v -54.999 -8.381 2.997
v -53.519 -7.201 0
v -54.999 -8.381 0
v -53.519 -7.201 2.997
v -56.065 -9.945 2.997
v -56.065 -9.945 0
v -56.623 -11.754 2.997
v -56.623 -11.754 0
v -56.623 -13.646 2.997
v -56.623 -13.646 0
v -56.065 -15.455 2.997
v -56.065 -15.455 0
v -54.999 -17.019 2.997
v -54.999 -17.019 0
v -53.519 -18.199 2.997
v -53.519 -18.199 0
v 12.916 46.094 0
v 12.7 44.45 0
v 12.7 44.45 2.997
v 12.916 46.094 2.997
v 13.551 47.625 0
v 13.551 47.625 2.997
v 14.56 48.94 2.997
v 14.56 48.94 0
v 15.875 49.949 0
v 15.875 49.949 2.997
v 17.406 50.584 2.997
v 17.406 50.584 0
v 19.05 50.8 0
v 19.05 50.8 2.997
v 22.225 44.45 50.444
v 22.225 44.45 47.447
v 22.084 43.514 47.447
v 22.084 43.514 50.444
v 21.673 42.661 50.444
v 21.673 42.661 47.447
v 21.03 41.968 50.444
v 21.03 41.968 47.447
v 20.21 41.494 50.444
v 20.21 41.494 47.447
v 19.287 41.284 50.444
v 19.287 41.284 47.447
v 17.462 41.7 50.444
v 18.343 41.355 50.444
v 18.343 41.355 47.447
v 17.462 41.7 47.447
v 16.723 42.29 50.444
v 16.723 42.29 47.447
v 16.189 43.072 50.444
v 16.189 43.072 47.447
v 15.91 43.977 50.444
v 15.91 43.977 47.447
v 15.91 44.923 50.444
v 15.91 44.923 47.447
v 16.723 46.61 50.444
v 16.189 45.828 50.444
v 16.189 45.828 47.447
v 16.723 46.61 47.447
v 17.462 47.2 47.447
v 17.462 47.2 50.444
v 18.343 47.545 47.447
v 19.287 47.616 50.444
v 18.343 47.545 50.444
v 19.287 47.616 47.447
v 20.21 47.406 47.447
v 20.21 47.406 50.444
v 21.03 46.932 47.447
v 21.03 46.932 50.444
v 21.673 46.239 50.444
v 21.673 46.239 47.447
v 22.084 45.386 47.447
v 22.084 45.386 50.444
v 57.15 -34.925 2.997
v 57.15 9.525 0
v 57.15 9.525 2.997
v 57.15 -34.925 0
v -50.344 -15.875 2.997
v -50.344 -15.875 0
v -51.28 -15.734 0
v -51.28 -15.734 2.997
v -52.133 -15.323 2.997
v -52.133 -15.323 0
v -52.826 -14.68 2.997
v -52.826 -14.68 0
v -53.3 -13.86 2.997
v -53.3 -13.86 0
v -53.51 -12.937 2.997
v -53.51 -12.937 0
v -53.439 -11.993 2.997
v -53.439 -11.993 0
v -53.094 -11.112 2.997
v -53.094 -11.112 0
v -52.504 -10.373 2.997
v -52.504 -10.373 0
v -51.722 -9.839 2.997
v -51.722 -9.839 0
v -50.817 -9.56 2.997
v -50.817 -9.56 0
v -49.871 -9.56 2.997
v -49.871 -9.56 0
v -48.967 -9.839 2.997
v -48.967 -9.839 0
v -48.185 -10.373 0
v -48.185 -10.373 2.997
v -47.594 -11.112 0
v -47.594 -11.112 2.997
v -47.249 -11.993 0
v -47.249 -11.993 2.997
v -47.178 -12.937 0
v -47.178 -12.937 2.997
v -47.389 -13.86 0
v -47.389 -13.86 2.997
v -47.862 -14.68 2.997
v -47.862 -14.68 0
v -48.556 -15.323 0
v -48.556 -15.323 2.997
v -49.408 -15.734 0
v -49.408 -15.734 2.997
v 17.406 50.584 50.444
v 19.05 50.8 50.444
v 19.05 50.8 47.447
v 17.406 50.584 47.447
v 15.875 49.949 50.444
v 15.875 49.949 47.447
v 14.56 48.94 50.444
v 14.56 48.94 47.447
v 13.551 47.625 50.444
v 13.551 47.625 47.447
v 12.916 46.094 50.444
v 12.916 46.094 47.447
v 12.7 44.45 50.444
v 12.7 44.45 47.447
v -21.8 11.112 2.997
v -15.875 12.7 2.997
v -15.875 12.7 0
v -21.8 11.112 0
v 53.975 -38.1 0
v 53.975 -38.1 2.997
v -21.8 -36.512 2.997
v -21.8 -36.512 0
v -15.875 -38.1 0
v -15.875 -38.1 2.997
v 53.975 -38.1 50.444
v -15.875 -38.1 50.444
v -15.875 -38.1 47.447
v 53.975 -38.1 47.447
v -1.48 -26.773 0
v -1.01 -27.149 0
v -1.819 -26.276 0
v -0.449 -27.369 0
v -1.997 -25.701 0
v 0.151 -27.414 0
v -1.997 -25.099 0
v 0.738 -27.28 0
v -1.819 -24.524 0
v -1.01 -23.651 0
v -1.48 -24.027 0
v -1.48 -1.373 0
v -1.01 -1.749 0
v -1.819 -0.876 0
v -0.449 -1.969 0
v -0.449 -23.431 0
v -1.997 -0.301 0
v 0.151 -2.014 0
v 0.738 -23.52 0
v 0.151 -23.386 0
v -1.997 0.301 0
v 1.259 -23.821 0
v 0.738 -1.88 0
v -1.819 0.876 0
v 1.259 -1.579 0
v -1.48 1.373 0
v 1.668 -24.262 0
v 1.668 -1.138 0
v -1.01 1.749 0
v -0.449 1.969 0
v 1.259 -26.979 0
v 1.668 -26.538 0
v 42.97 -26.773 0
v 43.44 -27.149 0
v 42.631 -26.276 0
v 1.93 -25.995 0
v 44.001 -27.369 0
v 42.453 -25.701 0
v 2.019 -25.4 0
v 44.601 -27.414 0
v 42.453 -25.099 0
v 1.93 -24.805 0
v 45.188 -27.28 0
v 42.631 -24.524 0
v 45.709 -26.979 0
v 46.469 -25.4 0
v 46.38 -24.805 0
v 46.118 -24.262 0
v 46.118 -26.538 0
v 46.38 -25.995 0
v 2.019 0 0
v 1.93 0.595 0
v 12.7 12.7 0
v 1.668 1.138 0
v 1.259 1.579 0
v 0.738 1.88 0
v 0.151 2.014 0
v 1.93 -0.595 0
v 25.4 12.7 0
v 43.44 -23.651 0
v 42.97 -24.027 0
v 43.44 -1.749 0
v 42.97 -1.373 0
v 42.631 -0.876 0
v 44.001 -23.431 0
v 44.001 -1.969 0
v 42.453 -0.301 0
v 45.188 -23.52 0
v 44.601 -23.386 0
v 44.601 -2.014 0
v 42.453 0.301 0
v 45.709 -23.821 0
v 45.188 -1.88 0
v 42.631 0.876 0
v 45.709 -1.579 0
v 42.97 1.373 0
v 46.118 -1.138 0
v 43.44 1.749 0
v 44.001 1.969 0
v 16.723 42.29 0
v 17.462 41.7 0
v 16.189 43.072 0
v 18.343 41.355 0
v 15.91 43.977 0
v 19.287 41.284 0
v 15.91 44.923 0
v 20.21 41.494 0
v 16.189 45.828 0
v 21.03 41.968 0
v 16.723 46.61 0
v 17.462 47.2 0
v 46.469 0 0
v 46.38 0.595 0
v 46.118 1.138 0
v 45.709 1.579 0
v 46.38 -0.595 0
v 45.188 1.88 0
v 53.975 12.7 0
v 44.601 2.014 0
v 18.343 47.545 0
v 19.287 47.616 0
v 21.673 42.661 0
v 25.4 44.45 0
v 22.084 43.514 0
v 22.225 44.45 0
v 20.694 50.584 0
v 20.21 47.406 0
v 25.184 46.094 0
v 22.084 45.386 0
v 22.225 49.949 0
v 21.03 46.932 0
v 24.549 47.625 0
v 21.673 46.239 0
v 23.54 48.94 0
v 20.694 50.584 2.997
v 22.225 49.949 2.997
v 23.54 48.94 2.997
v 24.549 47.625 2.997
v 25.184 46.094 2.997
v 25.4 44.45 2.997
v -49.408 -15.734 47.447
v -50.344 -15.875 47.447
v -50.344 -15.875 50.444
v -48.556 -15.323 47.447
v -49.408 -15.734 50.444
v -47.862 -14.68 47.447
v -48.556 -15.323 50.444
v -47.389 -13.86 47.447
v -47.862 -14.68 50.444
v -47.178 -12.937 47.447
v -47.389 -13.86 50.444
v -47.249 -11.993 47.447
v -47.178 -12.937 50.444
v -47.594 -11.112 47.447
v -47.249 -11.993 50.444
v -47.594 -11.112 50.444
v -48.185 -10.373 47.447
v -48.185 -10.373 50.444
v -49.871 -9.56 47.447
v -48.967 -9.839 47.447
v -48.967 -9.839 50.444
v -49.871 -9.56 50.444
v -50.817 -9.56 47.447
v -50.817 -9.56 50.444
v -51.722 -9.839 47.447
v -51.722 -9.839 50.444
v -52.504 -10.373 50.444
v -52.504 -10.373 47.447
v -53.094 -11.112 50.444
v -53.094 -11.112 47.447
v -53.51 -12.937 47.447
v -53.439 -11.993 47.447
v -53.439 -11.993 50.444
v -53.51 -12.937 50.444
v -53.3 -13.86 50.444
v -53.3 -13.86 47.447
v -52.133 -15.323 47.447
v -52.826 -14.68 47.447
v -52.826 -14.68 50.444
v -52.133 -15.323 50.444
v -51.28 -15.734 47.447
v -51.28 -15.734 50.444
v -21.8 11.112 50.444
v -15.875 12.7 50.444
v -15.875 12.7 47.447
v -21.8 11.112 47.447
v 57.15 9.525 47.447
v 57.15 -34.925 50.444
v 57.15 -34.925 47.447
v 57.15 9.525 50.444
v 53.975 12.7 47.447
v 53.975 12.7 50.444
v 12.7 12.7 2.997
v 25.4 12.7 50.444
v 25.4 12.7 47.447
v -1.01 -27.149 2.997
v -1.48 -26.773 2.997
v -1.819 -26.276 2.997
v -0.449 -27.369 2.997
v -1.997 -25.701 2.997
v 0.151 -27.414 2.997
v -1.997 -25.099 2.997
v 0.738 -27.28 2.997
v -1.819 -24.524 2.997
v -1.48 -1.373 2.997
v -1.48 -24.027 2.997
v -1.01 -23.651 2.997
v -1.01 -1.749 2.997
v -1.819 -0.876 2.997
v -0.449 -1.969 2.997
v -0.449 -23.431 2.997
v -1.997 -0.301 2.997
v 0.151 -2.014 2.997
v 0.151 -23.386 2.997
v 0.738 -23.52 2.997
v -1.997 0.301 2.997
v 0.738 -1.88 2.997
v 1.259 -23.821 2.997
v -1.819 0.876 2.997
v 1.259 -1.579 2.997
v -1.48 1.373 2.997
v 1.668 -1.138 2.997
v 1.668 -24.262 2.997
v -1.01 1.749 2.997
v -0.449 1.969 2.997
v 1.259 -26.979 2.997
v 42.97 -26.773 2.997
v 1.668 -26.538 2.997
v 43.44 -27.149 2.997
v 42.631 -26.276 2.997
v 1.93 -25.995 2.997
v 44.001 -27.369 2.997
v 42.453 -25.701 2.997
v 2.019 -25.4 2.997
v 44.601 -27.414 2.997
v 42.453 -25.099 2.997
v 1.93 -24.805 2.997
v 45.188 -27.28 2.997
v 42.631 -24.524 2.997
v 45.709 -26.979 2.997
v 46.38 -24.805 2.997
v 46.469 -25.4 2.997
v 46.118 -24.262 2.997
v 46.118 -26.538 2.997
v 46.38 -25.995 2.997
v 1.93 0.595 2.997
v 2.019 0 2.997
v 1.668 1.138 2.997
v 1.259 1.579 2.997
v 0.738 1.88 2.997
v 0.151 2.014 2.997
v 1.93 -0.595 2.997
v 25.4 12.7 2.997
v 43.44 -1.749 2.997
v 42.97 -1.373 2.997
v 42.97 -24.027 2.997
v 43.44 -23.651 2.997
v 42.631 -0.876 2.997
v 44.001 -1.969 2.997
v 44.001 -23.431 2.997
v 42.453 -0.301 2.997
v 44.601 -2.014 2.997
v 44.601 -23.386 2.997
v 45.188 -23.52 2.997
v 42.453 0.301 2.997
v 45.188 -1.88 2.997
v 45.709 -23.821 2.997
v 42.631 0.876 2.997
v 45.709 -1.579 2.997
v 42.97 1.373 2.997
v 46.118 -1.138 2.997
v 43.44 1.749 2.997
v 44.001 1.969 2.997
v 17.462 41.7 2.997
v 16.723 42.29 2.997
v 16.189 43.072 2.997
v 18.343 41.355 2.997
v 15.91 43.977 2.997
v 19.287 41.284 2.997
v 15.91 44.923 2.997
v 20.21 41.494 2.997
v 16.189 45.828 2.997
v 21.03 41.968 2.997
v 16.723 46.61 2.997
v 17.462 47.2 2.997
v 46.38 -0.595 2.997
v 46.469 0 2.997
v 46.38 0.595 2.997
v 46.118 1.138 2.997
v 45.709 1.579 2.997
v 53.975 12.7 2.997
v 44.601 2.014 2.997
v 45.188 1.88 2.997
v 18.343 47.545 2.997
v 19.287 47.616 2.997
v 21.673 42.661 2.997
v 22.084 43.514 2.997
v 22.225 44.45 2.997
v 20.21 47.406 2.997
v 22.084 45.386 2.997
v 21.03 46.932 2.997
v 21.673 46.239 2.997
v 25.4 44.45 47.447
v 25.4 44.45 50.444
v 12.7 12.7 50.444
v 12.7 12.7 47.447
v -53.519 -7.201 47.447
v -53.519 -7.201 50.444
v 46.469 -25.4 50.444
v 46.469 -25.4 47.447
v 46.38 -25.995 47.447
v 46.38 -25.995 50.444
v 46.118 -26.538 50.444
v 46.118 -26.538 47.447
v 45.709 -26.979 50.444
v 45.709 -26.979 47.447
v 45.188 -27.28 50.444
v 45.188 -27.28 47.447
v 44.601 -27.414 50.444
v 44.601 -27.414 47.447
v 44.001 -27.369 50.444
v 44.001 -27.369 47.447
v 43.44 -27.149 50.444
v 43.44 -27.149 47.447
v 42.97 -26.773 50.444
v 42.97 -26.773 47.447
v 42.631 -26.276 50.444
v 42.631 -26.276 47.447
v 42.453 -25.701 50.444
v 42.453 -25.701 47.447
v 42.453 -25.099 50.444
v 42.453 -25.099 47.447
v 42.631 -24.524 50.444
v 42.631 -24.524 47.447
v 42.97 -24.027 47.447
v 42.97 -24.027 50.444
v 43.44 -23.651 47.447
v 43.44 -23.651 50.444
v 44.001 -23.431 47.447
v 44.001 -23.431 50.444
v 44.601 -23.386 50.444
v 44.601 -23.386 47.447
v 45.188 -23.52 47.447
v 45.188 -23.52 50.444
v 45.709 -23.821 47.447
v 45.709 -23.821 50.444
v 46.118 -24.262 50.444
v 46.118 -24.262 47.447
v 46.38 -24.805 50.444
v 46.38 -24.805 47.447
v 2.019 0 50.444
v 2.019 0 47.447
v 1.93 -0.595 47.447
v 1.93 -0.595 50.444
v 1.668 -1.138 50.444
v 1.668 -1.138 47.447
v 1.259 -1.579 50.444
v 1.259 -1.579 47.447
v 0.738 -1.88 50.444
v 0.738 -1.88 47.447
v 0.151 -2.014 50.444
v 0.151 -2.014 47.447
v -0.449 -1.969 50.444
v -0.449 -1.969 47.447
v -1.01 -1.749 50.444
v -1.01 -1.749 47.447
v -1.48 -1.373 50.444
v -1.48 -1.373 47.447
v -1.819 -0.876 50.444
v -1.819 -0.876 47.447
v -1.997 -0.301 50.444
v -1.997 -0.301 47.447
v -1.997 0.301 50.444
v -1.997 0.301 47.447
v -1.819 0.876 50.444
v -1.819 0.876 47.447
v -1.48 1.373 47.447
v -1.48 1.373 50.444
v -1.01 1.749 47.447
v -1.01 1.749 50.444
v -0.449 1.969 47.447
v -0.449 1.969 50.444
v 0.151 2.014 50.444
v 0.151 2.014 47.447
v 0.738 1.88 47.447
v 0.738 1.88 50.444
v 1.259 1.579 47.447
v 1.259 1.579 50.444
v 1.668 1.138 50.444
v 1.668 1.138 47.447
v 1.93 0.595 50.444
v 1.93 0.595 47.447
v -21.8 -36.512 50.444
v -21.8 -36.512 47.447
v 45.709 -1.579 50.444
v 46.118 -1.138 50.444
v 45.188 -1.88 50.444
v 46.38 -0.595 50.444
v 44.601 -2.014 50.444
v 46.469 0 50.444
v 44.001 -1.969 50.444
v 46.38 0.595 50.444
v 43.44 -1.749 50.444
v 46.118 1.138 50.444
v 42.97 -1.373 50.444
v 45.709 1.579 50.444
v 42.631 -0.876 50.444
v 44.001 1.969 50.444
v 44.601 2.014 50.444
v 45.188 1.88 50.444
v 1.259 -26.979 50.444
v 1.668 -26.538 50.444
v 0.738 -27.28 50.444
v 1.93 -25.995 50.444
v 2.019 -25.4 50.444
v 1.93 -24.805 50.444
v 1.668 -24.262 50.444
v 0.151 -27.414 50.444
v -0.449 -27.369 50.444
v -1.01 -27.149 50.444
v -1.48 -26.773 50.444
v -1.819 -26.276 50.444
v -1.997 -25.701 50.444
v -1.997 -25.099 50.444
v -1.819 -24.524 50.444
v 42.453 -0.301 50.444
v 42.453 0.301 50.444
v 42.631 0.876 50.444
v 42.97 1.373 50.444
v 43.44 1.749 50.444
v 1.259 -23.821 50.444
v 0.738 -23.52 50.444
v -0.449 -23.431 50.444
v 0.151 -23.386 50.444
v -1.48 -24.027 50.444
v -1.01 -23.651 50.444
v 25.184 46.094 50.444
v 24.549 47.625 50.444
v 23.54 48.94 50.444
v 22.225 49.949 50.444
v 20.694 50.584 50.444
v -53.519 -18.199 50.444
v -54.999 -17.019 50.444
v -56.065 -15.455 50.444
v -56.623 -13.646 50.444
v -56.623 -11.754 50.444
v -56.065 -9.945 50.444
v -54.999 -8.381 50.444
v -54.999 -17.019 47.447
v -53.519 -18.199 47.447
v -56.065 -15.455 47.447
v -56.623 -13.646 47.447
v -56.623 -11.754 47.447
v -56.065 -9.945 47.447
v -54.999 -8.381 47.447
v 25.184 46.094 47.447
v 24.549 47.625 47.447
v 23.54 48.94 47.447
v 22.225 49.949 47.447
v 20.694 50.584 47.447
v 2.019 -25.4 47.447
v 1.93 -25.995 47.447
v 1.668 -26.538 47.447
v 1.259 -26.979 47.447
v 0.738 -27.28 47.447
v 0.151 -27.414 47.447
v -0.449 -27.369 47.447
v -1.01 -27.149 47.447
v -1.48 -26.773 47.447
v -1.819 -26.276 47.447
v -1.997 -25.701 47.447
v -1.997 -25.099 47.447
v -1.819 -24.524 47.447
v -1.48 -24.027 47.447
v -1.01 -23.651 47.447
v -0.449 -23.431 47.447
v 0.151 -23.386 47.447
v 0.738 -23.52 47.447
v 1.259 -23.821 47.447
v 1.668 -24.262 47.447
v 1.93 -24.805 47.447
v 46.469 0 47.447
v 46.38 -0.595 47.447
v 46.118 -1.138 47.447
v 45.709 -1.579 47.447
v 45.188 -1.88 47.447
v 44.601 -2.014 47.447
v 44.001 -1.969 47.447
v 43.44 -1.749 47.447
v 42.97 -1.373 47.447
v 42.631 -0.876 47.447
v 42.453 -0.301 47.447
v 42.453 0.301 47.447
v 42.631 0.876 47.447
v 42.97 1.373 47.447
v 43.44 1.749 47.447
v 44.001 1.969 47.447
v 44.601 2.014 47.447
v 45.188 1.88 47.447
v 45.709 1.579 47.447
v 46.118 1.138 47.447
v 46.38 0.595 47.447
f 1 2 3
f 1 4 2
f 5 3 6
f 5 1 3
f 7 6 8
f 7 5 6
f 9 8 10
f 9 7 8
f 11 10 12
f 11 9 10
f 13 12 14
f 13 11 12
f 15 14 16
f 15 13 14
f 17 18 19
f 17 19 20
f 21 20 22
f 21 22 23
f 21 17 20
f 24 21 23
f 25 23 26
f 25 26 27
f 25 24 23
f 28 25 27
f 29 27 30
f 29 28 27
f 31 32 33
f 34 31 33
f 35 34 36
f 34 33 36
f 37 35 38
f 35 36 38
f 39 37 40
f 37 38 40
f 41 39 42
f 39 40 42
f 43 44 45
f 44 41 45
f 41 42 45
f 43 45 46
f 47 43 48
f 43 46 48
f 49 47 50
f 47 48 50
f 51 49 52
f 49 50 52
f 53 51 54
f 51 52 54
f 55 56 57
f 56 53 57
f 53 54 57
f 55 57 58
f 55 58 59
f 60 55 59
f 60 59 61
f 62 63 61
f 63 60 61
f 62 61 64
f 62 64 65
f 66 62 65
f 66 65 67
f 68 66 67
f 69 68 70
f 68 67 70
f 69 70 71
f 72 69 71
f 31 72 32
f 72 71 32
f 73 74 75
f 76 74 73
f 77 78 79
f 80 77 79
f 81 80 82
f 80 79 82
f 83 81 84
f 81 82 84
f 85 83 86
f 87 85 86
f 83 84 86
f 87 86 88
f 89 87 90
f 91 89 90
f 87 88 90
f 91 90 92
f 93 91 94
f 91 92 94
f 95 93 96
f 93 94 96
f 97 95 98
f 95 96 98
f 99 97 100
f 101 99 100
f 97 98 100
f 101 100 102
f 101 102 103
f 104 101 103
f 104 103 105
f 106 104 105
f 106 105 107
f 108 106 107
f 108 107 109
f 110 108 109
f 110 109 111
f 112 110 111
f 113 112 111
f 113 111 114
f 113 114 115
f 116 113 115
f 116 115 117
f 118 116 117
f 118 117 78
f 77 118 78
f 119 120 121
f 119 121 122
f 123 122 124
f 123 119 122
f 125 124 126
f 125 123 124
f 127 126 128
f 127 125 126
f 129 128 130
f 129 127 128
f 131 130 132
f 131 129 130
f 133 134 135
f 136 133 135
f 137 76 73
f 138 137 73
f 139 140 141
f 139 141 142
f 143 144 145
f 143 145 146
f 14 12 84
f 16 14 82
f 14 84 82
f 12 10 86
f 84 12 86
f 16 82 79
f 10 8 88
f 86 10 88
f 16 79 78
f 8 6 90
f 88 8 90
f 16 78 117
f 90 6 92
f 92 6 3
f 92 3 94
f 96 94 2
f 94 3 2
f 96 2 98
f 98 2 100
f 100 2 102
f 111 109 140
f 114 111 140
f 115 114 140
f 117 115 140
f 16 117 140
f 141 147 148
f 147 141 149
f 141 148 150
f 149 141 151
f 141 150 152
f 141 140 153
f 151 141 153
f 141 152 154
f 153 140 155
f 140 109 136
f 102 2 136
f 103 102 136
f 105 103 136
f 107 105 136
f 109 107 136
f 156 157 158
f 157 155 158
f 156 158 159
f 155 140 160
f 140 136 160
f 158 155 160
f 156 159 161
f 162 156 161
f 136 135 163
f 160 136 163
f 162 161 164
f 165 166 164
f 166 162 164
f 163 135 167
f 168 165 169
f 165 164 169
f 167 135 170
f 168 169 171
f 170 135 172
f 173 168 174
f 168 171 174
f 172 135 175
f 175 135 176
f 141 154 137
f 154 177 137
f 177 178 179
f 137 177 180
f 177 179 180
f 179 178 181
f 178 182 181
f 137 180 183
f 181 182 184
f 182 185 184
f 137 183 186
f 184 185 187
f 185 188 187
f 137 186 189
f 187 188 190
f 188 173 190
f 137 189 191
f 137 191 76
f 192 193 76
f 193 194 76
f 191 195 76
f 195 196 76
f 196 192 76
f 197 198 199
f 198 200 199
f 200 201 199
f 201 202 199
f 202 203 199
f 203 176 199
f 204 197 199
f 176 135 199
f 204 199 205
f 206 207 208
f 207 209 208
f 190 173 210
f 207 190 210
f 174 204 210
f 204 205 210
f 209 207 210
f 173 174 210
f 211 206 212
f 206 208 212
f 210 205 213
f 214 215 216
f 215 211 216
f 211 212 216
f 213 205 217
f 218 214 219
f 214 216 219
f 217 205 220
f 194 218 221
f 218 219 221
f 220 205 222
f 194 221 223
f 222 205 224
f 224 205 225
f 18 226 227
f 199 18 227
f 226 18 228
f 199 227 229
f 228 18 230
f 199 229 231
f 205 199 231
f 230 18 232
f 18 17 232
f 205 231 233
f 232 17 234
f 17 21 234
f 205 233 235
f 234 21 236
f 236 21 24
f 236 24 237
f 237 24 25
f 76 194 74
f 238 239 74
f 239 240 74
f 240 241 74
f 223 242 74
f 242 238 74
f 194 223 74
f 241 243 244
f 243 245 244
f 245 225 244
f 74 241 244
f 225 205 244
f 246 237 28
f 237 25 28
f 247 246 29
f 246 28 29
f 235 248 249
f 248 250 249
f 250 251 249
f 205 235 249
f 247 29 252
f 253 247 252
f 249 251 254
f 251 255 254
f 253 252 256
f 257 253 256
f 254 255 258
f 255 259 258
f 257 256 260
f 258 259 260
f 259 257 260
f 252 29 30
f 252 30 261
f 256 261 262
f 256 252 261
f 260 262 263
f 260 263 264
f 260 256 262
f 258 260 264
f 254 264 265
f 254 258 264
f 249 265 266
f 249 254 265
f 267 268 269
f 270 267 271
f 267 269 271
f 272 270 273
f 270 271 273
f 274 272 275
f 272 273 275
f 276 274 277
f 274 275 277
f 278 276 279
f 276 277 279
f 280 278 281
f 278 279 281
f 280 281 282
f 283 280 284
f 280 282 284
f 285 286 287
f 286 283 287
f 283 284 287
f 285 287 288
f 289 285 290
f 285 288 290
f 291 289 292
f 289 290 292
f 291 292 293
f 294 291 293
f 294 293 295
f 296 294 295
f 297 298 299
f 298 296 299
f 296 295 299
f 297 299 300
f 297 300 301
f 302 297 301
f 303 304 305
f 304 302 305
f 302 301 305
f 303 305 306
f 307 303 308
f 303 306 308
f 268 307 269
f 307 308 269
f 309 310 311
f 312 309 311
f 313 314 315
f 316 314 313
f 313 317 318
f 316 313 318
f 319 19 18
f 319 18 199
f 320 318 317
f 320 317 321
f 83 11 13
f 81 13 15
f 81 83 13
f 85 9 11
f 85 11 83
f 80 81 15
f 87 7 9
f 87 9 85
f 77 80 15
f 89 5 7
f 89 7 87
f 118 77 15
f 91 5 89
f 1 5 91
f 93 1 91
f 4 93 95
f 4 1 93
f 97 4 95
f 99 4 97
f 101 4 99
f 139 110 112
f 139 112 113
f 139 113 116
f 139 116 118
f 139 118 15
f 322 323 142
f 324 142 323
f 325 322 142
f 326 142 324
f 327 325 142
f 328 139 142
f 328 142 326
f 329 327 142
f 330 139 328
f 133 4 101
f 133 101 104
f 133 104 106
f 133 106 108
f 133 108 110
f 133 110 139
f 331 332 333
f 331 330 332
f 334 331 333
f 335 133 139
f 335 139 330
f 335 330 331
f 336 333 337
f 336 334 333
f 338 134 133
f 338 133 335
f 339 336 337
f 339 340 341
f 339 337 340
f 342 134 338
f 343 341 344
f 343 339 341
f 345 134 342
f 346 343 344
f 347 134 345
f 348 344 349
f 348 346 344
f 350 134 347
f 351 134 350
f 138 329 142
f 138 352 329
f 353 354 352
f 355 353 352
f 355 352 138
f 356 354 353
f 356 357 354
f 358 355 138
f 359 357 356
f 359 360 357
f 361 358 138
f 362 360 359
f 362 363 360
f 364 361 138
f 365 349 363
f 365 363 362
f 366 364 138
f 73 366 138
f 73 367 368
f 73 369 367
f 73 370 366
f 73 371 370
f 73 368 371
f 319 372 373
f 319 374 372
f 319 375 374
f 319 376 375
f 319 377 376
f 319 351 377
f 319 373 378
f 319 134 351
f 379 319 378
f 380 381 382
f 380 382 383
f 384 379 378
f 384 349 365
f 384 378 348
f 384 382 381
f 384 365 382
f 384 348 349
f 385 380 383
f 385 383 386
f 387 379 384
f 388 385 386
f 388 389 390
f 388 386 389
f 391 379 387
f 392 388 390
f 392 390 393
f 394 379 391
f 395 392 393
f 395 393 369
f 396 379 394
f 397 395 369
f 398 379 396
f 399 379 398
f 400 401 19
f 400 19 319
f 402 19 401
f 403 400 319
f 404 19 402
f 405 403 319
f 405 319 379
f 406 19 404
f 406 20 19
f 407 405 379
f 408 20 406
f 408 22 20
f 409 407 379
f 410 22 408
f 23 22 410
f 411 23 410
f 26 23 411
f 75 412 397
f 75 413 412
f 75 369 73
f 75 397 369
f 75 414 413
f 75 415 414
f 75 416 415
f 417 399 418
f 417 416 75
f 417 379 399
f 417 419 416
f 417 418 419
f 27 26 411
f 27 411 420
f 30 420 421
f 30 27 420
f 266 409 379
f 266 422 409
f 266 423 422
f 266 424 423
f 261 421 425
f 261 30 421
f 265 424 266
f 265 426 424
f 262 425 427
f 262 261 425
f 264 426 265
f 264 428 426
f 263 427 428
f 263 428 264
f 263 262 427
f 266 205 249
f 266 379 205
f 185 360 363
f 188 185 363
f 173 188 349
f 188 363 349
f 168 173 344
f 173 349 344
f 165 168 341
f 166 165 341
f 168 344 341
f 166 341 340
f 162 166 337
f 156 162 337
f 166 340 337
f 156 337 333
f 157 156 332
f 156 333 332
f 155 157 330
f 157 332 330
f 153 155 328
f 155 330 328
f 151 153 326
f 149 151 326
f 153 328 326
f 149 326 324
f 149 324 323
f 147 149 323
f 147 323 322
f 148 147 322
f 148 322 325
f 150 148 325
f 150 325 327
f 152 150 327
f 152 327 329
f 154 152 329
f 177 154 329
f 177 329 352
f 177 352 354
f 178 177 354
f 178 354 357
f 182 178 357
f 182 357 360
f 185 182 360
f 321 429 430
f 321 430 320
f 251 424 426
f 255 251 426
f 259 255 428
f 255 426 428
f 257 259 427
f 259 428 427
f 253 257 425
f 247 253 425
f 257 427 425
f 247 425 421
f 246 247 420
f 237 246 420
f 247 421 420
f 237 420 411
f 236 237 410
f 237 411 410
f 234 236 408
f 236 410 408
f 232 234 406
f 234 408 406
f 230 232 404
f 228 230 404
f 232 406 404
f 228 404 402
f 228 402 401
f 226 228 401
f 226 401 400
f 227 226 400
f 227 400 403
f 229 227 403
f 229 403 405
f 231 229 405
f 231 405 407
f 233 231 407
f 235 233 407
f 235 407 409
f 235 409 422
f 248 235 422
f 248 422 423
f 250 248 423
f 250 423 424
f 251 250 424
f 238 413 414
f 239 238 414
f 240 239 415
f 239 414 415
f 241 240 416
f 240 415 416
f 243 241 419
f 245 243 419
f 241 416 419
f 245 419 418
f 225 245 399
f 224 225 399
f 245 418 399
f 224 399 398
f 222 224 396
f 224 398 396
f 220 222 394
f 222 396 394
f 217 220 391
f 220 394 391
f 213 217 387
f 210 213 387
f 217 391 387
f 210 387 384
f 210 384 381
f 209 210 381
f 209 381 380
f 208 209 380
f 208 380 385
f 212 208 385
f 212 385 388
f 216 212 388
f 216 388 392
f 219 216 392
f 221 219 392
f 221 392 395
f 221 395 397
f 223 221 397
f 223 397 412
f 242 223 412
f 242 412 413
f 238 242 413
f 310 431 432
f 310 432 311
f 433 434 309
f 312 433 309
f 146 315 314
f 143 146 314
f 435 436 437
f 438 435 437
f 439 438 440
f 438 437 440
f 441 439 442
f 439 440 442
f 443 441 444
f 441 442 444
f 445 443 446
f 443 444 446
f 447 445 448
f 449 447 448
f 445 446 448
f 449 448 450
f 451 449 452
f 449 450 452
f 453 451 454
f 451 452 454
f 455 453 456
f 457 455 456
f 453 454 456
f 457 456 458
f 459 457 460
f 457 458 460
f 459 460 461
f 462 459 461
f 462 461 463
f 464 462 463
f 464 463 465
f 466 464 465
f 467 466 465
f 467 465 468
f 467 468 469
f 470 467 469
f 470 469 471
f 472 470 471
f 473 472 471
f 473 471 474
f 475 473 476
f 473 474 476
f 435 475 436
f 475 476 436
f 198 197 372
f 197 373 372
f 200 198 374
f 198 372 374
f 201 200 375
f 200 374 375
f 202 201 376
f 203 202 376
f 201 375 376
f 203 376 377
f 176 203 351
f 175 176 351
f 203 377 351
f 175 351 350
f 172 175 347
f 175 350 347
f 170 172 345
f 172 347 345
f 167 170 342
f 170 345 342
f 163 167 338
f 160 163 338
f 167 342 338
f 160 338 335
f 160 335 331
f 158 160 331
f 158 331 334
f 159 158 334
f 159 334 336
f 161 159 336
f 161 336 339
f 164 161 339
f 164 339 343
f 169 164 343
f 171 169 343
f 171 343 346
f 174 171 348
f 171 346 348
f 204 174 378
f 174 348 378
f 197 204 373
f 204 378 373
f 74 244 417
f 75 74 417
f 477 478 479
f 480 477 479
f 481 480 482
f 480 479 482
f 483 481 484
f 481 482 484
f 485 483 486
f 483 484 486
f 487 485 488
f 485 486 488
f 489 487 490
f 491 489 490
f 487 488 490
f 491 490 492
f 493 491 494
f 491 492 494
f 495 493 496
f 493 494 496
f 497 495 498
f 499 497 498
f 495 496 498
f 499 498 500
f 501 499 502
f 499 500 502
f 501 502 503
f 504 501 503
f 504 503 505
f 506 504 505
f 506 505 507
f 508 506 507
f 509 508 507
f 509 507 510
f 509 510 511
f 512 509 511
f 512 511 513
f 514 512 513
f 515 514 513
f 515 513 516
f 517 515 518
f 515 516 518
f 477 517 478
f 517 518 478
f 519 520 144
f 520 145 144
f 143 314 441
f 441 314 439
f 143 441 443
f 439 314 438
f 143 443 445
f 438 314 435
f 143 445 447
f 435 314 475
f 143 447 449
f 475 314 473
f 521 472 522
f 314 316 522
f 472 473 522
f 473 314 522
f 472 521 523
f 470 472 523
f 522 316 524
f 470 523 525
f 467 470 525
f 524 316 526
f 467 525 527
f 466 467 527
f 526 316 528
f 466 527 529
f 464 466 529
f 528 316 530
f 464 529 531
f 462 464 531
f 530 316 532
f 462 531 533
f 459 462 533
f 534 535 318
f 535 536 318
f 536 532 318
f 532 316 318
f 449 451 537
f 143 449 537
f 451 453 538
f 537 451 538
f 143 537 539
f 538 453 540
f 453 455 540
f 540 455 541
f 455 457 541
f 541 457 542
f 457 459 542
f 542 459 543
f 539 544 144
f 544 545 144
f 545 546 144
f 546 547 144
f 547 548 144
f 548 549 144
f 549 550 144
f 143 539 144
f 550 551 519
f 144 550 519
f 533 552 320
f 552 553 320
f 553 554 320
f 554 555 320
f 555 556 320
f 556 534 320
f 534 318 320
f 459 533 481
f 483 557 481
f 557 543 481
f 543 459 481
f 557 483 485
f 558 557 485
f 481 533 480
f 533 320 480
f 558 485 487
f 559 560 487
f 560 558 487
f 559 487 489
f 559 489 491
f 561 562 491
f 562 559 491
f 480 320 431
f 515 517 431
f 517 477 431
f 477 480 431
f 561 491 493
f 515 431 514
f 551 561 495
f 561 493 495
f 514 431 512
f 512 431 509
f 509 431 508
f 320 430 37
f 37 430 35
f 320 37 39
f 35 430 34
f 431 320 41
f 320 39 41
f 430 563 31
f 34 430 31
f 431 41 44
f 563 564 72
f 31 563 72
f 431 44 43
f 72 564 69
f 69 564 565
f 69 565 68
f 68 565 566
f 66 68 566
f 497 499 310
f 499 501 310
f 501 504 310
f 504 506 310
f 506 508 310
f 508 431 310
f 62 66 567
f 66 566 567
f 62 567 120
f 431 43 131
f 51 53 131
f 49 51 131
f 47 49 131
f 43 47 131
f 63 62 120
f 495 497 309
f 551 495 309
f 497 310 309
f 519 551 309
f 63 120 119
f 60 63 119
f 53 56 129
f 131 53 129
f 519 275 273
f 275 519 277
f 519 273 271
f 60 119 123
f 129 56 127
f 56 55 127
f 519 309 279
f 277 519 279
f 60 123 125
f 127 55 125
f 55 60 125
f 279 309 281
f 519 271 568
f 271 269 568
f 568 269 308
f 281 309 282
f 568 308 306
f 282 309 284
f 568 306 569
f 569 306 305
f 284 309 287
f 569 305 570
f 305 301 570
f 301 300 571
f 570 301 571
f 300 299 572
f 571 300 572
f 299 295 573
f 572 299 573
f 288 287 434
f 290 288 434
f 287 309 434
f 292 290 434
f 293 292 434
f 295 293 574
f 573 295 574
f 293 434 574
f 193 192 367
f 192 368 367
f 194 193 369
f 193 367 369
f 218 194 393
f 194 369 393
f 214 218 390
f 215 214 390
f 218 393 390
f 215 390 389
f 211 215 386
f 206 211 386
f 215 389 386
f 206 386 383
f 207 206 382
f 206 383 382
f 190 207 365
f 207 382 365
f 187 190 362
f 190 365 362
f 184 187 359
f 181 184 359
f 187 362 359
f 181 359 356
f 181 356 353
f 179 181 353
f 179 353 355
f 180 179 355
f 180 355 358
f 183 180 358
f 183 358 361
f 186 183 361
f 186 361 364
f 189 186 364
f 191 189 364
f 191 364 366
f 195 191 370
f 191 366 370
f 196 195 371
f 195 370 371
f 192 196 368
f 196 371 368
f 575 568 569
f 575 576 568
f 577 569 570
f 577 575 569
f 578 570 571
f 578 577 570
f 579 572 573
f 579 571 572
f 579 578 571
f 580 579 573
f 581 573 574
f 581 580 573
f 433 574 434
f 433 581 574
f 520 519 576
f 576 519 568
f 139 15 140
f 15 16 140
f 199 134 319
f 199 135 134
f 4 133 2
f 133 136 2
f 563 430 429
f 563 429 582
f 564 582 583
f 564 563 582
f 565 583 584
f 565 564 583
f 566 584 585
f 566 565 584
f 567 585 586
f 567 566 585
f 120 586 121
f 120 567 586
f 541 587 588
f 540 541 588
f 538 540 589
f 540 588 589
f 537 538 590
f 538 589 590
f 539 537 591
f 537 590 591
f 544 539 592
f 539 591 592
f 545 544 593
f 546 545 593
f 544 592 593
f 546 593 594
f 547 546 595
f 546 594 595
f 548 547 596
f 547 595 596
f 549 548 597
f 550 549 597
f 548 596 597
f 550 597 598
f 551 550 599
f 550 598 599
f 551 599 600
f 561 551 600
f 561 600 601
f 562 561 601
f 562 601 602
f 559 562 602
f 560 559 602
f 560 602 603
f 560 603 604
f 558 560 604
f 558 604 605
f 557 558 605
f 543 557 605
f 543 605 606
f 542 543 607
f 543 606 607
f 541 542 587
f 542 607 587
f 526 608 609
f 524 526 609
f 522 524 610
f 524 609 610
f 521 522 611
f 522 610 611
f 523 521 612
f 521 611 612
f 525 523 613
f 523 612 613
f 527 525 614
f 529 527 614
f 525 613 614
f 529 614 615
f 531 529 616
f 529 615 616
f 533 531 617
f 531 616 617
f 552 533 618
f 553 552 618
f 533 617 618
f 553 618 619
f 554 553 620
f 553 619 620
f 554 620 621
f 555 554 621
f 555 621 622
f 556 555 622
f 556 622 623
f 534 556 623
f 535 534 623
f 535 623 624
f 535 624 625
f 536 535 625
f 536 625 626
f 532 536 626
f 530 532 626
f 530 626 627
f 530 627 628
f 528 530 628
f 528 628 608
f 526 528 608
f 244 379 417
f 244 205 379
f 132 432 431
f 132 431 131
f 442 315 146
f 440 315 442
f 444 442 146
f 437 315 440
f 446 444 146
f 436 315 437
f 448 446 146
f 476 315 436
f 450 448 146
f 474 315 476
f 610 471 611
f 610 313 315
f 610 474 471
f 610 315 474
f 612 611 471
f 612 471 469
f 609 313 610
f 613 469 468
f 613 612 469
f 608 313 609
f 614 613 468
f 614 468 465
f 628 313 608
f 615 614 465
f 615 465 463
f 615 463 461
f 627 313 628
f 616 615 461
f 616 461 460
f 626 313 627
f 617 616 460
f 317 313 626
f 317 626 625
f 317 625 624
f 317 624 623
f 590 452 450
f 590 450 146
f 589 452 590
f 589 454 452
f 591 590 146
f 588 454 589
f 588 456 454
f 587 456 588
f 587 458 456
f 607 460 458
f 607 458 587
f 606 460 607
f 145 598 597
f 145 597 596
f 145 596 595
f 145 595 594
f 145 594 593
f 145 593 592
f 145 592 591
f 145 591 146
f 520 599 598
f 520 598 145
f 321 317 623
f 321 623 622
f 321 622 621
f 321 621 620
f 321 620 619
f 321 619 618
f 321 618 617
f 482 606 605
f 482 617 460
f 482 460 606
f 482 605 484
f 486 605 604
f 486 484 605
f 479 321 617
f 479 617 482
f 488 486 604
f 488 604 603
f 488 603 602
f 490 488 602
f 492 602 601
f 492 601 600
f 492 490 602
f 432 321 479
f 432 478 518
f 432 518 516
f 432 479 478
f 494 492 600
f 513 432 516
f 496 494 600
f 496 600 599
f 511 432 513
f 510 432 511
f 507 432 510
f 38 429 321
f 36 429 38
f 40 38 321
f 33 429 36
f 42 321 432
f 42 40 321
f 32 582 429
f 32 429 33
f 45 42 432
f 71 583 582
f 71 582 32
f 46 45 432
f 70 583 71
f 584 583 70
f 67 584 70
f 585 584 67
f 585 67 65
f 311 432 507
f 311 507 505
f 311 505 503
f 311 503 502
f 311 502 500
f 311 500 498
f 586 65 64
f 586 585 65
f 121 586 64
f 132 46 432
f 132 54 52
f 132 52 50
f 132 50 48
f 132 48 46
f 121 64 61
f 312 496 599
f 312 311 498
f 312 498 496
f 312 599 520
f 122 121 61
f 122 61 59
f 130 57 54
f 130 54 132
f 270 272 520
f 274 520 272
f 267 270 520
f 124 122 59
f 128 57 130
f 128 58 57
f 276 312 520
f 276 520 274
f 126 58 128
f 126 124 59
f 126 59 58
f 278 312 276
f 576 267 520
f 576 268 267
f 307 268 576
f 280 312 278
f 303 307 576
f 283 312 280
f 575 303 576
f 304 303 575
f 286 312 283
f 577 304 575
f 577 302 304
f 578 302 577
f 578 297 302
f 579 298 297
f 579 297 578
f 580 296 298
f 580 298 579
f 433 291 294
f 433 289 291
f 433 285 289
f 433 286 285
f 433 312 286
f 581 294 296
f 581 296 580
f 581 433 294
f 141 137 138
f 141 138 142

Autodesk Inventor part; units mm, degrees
ref_plane "YZ Plane" through (0, 0, 0) normal (1, 0, 0) x (0, 1, 0)
ref_plane "XZ Plane" through (0, 0, 0) normal (0, 1, 0) x (-1, 0, 0)
sketch "Sketch1" plane through (0, 0, 0) normal (0, 0, 1) x (1, 0, 0)
  line L0 (0, 0) -> (44.45, 0) construction
  line L1 (44.45, 0) -> (44.45, -25.4) construction
  line L2 (44.45, -25.4) -> (0, -25.4) construction
  line L3 (0, -25.4) -> (0, 0) construction
  line L4 (-19.05, 12.7) -> (57.15, 12.7)
  line L5 (57.15, 12.7) -> (57.15, -38.1)
  line L6 (57.15, -38.1) -> (-19.05, -38.1)
  line L7 (-19.05, 12.7) -> (-63.0441, -12.7)
  line L8 (-63.0441, -12.7) -> (-19.05, -38.1)
  line L9 (-19.05, 12.7) -> (-19.05, -38.1) construction
  dimension "d0" = 44.45
  dimension "d1" = 25.4
  dimension "d2" = 12.7
  dimension "d3" = 12.7
  dimension "d5" = 12.7
  dimension "d37" = 76.2
  dimension "d38" = 50.8
extrude "Extrusion1" add sketch "Sketch1" along normal blind 2.9972
sketch "Sketch2" plane through (0, 0, 2.9972) normal (0, 0, 1) x (1, 0, 0)
  line L0 (0, -25.4) -> (44.45, -25.4) construction
  line L1 (44.45, -25.4) -> (44.45, 0) construction
  line L2 (44.45, 0) -> (0, 0) construction
  line L3 (0, 0) -> (0, -25.4) construction
  line L4 (-19.05, -38.1) -> (57.15, -38.1) projected
  line L5 (57.15, -38.1) -> (57.15, 12.7) projected
  circle A0 centre (0, 0) radius 2.0193
  circle A1 centre (44.45, 0) radius 2.0193
  circle A2 centre (44.45, -25.4) radius 2.0193
  circle A3 centre (0, -25.4) radius 2.0193
  point P0 (0, 0)
  dimension "d8" = 12.7
  dimension "d9" = 25.4
  dimension "d10" = 12.7
  dimension "d11" = 44.45
  dimension "d12" = 4.0386
extrude "Extrusion2" cut sketch "Sketch2" against normal through all
fillet "Fillet1" radius 6.35 1 edges at (-63.0441, -12.7, 1.4986)
chamfer "Chamfer1" distance 3.175 angle 45 4 edges at (57.15, 12.7, 1.4986) (57.15, -38.1, 1.4986) (-19.05, 12.7, 1.4986) (-19.05, -38.1, 1.4986)
sketch "Sketch3" plane through (0, 0, 2.9972) normal (0, 0, 1) x (1, 0, 0)
  arc A0 (-53.5191, -7.2007) -> (-53.5191, -18.1993) centre (-50.3441, -12.7) ccw projected
  circle A1 centre (-50.3441, -12.7) radius 3.175
  point P0 (0, 0)
  dimension "d19" = 6.35
hole "Hole1" at (-50.3441, -12.7, 2.9972) direction (0, 0, -1) diameter 6.35 end through all
sketch "Sketch4" plane through (0, 0, 2.9972) normal (0, 0, 1) x (1, 0, 0)
  circle A0 centre (19.05, 44.45) radius 3.175
  line L0 (53.975, 12.7) -> (-15.875, 12.7) projected
  line L1 (12.7, 12.7) -> (25.4, 12.7)
  line L2 (25.4, 12.7) -> (25.4, 50.8)
  line L3 (25.4, 50.8) -> (12.7, 50.8)
  line L4 (12.7, 50.8) -> (12.7, 12.7)
  line L5 (57.15, -34.925) -> (57.15, 9.525) projected
  point P0 (0, 0)
  dimension "d27" = 6.35
  dimension "d28" = 6.35
  dimension "d29" = 12.7
  dimension "d30" = 6.35
  dimension "d31" = 31.75
  dimension "d32" = 38.1
extrude "Extrusion3" add sketch "Sketch4" against normal blind 2.9972
fillet "Fillet2" radius 6.35 2 edges at (12.7, 50.8, 1.4986) (25.4, 50.8, 1.4986)
ref_plane "Work Plane1" through (0, 0, 25.2222) normal (0, 0, 1) x (1, 0, 0)
mirror "Mirror1" about plane through (0, 0, 25.2222) normal (0, 0, 1) of "Extrusion1", "Extrusion2", "Fillet1", "Chamfer1", "Hole1", "Extrusion3", "Fillet2"
properties part number "Papa John Mounting Plate with hinge half 1" material "Polycarbonate, Clear"
